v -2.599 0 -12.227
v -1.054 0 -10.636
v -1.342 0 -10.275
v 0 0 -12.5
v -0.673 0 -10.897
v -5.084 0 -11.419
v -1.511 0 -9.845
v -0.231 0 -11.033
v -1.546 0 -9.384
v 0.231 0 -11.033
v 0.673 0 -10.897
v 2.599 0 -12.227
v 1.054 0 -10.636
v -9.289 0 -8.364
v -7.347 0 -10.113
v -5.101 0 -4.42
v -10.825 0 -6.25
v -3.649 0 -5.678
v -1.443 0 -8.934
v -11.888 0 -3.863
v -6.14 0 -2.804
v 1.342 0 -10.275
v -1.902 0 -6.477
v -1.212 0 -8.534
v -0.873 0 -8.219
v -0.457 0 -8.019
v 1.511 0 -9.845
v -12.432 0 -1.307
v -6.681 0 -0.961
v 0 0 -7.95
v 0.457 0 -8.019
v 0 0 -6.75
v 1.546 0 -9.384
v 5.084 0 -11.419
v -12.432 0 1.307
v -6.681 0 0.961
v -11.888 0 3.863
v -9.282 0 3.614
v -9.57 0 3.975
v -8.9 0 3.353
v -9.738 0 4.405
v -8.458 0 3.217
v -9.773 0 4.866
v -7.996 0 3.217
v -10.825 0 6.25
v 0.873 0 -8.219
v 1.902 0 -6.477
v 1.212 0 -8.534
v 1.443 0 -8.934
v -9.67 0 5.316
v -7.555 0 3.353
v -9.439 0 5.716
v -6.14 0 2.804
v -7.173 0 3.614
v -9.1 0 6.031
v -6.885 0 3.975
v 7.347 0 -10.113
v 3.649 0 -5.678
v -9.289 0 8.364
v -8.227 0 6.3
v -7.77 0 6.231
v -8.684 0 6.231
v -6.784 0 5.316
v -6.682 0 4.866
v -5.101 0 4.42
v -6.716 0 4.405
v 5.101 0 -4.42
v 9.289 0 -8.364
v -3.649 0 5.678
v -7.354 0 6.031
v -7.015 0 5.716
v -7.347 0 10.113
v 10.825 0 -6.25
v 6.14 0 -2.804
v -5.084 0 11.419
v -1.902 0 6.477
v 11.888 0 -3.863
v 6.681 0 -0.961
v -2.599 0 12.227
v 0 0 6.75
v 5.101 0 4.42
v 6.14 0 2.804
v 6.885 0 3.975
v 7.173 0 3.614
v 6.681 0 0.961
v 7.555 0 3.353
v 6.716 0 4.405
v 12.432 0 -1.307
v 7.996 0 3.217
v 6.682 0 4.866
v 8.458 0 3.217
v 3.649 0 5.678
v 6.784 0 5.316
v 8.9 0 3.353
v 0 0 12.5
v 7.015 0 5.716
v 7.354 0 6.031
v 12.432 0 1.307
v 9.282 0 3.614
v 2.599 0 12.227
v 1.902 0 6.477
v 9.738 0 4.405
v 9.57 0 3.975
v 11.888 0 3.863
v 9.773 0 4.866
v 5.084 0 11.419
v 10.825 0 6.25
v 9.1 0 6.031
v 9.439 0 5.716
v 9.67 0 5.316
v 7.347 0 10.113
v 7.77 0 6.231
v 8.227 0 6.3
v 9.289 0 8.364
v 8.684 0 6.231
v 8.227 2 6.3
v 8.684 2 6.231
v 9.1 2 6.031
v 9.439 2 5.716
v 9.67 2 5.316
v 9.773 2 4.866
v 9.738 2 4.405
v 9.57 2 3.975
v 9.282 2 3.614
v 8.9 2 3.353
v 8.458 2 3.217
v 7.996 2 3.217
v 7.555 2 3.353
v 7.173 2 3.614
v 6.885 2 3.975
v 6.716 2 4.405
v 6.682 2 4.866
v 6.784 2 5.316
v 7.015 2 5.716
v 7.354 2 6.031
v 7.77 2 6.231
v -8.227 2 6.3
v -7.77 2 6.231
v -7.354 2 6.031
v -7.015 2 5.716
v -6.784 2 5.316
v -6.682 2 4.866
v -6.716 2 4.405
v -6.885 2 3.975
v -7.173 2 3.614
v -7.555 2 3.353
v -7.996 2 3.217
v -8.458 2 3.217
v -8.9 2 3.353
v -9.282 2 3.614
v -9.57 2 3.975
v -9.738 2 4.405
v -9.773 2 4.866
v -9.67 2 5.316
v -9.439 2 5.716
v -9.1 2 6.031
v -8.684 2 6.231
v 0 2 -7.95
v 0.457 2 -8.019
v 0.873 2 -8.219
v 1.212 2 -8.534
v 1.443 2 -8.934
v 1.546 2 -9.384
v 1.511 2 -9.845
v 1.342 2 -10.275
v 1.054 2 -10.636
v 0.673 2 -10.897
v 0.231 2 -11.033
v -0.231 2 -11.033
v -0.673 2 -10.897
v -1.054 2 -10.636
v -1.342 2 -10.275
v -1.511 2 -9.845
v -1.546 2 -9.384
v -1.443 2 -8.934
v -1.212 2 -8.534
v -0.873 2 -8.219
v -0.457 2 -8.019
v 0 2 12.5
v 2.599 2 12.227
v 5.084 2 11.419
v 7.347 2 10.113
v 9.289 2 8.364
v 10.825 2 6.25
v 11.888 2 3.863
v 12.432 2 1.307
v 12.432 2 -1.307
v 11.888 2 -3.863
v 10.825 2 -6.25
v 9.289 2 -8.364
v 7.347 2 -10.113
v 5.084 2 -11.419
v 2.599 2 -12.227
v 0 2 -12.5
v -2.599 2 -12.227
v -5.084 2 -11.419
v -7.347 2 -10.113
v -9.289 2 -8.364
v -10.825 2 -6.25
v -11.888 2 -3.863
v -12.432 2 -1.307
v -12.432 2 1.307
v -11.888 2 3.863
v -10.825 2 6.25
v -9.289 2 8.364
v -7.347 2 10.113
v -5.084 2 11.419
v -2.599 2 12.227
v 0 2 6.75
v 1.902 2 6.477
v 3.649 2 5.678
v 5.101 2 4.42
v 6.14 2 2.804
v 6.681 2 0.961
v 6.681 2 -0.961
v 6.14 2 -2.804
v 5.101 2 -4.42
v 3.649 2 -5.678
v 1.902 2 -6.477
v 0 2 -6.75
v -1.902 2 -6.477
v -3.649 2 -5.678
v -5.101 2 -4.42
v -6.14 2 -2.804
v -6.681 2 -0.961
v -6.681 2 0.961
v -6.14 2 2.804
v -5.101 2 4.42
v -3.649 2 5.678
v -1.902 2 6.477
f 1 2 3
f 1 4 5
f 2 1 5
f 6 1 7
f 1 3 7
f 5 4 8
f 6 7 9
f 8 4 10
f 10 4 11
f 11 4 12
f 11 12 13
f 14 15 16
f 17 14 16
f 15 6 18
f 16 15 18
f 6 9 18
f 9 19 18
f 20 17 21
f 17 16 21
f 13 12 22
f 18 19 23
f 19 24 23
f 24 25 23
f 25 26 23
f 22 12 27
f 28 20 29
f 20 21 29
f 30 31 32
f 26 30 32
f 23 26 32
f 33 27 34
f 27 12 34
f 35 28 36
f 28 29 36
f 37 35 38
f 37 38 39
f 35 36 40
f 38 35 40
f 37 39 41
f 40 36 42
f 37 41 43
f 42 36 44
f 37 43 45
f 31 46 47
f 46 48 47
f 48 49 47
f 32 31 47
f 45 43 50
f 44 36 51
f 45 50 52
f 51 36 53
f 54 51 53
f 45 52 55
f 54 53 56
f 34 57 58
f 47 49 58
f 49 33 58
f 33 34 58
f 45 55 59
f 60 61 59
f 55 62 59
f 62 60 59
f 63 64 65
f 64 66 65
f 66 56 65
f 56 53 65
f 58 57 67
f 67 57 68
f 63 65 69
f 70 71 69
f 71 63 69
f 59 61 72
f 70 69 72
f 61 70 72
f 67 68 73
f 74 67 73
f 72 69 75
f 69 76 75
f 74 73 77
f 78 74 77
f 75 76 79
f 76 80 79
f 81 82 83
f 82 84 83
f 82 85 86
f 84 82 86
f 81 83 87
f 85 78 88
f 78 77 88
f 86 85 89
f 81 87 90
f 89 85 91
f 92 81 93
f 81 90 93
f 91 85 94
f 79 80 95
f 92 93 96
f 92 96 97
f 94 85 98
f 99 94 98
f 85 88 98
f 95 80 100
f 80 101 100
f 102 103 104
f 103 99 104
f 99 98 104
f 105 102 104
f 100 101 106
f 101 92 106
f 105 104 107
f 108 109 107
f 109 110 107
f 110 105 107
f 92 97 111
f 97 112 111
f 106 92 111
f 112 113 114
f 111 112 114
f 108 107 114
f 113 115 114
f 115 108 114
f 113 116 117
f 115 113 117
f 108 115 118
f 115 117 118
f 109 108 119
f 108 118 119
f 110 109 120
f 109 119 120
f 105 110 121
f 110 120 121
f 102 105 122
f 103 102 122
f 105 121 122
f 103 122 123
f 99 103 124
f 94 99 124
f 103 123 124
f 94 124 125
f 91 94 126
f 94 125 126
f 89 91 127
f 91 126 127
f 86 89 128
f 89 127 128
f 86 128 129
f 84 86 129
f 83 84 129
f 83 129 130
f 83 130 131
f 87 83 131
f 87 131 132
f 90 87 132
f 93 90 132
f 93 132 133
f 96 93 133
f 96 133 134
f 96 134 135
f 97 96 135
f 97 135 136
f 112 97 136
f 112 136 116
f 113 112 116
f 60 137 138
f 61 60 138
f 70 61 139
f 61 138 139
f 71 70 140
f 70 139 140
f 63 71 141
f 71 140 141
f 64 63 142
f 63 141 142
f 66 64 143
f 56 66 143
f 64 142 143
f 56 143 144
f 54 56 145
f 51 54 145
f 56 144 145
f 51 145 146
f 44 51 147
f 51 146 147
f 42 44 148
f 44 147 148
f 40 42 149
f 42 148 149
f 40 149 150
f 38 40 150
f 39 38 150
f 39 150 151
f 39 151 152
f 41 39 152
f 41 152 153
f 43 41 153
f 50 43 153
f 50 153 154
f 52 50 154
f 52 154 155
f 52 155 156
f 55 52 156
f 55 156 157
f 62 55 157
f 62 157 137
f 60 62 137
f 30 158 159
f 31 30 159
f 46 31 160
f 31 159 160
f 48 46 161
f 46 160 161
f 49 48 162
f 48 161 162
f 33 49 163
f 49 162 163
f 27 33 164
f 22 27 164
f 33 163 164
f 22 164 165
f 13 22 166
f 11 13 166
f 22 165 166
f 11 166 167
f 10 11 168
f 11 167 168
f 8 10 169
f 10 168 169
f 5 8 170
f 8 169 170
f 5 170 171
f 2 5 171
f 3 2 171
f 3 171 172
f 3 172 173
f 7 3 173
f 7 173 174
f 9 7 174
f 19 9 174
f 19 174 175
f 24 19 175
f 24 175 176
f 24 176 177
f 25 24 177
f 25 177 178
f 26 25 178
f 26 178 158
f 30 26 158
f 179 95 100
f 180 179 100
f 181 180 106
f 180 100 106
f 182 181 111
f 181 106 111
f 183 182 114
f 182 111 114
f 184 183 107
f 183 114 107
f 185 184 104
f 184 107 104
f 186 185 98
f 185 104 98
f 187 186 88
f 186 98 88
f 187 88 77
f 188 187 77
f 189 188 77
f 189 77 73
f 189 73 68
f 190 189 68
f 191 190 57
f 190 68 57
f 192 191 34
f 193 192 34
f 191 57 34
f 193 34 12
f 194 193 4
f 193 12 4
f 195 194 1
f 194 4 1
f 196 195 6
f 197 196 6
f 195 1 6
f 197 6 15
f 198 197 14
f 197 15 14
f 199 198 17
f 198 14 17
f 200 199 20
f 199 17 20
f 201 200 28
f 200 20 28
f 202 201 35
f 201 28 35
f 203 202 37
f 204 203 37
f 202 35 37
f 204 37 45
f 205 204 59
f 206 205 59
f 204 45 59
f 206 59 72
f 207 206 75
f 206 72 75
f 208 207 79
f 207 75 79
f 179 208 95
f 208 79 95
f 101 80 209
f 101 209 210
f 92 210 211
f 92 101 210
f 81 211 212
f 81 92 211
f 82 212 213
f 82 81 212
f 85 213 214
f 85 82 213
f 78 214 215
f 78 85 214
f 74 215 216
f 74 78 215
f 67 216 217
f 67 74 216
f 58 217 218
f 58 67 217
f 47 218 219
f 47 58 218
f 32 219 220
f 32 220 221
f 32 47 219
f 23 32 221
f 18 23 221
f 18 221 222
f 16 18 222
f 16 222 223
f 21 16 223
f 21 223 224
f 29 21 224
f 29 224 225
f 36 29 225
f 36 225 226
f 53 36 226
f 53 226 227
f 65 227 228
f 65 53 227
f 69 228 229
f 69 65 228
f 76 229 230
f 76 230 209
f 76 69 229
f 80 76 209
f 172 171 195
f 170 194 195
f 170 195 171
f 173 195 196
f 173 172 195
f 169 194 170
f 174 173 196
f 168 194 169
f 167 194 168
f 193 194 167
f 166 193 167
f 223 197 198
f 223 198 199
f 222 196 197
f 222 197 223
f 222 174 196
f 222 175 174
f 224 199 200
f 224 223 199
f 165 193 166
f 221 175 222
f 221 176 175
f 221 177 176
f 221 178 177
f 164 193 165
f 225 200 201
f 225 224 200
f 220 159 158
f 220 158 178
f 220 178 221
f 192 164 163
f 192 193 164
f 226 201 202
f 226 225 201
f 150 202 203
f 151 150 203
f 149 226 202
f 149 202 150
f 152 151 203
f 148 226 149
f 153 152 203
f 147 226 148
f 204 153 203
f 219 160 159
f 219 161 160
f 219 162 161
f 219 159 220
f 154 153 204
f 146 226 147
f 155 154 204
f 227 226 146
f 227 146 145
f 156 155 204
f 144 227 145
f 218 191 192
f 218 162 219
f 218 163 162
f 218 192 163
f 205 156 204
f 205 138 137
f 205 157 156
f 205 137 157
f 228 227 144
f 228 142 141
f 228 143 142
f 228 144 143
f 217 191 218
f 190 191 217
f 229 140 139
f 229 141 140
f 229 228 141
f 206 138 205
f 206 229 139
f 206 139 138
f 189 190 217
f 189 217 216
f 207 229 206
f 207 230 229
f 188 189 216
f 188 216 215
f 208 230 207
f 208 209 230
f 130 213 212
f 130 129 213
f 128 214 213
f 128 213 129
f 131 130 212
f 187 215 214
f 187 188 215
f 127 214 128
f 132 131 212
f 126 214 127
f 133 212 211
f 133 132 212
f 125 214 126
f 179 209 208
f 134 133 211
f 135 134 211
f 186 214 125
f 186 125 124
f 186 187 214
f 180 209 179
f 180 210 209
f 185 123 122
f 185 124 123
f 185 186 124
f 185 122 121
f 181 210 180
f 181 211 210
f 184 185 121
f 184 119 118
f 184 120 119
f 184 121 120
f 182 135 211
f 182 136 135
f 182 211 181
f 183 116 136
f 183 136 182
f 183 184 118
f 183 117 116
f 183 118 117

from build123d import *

# Parameters (mm, degrees)
SKETCH_2_R          = 12.5
SKETCH_2_R_2        = 6.75
EXTRUDE_1_DEPTH     = 2
SKETCH_3_R          = 1.55
CUT_EXTRUDE_1_DEPTH = 18.790446875


with BuildPart() as part:
    # 草图2 → 凸台-拉伸1 (new body)
    with BuildSketch(Plane(origin=(0, 0, 0), x_dir=(1, 0, 0), z_dir=(0, 1, 0))):
        with Locations(Location((0, 0, 0), (0, 0, 270))):
            Circle(SKETCH_2_R)
        with Locations(Location((0, 0, 0), (0, 0, 270))):
            Circle(SKETCH_2_R_2, mode=Mode.SUBTRACT)
    extrude(amount=EXTRUDE_1_DEPTH)

    # 草图3 → 切除-拉伸1 (cut, through all)
    with BuildSketch(Plane(origin=(0, 2, 0), x_dir=(1, 0, 0), z_dir=(0, 1, 0))):
        with Locations(Location((0, 9.5, 0), (0, 0, 270))):
            Circle(SKETCH_3_R)
        with Locations(Location((8.227241336, -4.75, 0), (0, 0, 270))):
            Circle(SKETCH_3_R)
        with Locations(Location((-8.227241336, -4.75, 0), (0, 0, 270))):
            Circle(SKETCH_3_R)
    extrude(amount=-CUT_EXTRUDE_1_DEPTH, mode=Mode.SUBTRACT)


solid = part.part
